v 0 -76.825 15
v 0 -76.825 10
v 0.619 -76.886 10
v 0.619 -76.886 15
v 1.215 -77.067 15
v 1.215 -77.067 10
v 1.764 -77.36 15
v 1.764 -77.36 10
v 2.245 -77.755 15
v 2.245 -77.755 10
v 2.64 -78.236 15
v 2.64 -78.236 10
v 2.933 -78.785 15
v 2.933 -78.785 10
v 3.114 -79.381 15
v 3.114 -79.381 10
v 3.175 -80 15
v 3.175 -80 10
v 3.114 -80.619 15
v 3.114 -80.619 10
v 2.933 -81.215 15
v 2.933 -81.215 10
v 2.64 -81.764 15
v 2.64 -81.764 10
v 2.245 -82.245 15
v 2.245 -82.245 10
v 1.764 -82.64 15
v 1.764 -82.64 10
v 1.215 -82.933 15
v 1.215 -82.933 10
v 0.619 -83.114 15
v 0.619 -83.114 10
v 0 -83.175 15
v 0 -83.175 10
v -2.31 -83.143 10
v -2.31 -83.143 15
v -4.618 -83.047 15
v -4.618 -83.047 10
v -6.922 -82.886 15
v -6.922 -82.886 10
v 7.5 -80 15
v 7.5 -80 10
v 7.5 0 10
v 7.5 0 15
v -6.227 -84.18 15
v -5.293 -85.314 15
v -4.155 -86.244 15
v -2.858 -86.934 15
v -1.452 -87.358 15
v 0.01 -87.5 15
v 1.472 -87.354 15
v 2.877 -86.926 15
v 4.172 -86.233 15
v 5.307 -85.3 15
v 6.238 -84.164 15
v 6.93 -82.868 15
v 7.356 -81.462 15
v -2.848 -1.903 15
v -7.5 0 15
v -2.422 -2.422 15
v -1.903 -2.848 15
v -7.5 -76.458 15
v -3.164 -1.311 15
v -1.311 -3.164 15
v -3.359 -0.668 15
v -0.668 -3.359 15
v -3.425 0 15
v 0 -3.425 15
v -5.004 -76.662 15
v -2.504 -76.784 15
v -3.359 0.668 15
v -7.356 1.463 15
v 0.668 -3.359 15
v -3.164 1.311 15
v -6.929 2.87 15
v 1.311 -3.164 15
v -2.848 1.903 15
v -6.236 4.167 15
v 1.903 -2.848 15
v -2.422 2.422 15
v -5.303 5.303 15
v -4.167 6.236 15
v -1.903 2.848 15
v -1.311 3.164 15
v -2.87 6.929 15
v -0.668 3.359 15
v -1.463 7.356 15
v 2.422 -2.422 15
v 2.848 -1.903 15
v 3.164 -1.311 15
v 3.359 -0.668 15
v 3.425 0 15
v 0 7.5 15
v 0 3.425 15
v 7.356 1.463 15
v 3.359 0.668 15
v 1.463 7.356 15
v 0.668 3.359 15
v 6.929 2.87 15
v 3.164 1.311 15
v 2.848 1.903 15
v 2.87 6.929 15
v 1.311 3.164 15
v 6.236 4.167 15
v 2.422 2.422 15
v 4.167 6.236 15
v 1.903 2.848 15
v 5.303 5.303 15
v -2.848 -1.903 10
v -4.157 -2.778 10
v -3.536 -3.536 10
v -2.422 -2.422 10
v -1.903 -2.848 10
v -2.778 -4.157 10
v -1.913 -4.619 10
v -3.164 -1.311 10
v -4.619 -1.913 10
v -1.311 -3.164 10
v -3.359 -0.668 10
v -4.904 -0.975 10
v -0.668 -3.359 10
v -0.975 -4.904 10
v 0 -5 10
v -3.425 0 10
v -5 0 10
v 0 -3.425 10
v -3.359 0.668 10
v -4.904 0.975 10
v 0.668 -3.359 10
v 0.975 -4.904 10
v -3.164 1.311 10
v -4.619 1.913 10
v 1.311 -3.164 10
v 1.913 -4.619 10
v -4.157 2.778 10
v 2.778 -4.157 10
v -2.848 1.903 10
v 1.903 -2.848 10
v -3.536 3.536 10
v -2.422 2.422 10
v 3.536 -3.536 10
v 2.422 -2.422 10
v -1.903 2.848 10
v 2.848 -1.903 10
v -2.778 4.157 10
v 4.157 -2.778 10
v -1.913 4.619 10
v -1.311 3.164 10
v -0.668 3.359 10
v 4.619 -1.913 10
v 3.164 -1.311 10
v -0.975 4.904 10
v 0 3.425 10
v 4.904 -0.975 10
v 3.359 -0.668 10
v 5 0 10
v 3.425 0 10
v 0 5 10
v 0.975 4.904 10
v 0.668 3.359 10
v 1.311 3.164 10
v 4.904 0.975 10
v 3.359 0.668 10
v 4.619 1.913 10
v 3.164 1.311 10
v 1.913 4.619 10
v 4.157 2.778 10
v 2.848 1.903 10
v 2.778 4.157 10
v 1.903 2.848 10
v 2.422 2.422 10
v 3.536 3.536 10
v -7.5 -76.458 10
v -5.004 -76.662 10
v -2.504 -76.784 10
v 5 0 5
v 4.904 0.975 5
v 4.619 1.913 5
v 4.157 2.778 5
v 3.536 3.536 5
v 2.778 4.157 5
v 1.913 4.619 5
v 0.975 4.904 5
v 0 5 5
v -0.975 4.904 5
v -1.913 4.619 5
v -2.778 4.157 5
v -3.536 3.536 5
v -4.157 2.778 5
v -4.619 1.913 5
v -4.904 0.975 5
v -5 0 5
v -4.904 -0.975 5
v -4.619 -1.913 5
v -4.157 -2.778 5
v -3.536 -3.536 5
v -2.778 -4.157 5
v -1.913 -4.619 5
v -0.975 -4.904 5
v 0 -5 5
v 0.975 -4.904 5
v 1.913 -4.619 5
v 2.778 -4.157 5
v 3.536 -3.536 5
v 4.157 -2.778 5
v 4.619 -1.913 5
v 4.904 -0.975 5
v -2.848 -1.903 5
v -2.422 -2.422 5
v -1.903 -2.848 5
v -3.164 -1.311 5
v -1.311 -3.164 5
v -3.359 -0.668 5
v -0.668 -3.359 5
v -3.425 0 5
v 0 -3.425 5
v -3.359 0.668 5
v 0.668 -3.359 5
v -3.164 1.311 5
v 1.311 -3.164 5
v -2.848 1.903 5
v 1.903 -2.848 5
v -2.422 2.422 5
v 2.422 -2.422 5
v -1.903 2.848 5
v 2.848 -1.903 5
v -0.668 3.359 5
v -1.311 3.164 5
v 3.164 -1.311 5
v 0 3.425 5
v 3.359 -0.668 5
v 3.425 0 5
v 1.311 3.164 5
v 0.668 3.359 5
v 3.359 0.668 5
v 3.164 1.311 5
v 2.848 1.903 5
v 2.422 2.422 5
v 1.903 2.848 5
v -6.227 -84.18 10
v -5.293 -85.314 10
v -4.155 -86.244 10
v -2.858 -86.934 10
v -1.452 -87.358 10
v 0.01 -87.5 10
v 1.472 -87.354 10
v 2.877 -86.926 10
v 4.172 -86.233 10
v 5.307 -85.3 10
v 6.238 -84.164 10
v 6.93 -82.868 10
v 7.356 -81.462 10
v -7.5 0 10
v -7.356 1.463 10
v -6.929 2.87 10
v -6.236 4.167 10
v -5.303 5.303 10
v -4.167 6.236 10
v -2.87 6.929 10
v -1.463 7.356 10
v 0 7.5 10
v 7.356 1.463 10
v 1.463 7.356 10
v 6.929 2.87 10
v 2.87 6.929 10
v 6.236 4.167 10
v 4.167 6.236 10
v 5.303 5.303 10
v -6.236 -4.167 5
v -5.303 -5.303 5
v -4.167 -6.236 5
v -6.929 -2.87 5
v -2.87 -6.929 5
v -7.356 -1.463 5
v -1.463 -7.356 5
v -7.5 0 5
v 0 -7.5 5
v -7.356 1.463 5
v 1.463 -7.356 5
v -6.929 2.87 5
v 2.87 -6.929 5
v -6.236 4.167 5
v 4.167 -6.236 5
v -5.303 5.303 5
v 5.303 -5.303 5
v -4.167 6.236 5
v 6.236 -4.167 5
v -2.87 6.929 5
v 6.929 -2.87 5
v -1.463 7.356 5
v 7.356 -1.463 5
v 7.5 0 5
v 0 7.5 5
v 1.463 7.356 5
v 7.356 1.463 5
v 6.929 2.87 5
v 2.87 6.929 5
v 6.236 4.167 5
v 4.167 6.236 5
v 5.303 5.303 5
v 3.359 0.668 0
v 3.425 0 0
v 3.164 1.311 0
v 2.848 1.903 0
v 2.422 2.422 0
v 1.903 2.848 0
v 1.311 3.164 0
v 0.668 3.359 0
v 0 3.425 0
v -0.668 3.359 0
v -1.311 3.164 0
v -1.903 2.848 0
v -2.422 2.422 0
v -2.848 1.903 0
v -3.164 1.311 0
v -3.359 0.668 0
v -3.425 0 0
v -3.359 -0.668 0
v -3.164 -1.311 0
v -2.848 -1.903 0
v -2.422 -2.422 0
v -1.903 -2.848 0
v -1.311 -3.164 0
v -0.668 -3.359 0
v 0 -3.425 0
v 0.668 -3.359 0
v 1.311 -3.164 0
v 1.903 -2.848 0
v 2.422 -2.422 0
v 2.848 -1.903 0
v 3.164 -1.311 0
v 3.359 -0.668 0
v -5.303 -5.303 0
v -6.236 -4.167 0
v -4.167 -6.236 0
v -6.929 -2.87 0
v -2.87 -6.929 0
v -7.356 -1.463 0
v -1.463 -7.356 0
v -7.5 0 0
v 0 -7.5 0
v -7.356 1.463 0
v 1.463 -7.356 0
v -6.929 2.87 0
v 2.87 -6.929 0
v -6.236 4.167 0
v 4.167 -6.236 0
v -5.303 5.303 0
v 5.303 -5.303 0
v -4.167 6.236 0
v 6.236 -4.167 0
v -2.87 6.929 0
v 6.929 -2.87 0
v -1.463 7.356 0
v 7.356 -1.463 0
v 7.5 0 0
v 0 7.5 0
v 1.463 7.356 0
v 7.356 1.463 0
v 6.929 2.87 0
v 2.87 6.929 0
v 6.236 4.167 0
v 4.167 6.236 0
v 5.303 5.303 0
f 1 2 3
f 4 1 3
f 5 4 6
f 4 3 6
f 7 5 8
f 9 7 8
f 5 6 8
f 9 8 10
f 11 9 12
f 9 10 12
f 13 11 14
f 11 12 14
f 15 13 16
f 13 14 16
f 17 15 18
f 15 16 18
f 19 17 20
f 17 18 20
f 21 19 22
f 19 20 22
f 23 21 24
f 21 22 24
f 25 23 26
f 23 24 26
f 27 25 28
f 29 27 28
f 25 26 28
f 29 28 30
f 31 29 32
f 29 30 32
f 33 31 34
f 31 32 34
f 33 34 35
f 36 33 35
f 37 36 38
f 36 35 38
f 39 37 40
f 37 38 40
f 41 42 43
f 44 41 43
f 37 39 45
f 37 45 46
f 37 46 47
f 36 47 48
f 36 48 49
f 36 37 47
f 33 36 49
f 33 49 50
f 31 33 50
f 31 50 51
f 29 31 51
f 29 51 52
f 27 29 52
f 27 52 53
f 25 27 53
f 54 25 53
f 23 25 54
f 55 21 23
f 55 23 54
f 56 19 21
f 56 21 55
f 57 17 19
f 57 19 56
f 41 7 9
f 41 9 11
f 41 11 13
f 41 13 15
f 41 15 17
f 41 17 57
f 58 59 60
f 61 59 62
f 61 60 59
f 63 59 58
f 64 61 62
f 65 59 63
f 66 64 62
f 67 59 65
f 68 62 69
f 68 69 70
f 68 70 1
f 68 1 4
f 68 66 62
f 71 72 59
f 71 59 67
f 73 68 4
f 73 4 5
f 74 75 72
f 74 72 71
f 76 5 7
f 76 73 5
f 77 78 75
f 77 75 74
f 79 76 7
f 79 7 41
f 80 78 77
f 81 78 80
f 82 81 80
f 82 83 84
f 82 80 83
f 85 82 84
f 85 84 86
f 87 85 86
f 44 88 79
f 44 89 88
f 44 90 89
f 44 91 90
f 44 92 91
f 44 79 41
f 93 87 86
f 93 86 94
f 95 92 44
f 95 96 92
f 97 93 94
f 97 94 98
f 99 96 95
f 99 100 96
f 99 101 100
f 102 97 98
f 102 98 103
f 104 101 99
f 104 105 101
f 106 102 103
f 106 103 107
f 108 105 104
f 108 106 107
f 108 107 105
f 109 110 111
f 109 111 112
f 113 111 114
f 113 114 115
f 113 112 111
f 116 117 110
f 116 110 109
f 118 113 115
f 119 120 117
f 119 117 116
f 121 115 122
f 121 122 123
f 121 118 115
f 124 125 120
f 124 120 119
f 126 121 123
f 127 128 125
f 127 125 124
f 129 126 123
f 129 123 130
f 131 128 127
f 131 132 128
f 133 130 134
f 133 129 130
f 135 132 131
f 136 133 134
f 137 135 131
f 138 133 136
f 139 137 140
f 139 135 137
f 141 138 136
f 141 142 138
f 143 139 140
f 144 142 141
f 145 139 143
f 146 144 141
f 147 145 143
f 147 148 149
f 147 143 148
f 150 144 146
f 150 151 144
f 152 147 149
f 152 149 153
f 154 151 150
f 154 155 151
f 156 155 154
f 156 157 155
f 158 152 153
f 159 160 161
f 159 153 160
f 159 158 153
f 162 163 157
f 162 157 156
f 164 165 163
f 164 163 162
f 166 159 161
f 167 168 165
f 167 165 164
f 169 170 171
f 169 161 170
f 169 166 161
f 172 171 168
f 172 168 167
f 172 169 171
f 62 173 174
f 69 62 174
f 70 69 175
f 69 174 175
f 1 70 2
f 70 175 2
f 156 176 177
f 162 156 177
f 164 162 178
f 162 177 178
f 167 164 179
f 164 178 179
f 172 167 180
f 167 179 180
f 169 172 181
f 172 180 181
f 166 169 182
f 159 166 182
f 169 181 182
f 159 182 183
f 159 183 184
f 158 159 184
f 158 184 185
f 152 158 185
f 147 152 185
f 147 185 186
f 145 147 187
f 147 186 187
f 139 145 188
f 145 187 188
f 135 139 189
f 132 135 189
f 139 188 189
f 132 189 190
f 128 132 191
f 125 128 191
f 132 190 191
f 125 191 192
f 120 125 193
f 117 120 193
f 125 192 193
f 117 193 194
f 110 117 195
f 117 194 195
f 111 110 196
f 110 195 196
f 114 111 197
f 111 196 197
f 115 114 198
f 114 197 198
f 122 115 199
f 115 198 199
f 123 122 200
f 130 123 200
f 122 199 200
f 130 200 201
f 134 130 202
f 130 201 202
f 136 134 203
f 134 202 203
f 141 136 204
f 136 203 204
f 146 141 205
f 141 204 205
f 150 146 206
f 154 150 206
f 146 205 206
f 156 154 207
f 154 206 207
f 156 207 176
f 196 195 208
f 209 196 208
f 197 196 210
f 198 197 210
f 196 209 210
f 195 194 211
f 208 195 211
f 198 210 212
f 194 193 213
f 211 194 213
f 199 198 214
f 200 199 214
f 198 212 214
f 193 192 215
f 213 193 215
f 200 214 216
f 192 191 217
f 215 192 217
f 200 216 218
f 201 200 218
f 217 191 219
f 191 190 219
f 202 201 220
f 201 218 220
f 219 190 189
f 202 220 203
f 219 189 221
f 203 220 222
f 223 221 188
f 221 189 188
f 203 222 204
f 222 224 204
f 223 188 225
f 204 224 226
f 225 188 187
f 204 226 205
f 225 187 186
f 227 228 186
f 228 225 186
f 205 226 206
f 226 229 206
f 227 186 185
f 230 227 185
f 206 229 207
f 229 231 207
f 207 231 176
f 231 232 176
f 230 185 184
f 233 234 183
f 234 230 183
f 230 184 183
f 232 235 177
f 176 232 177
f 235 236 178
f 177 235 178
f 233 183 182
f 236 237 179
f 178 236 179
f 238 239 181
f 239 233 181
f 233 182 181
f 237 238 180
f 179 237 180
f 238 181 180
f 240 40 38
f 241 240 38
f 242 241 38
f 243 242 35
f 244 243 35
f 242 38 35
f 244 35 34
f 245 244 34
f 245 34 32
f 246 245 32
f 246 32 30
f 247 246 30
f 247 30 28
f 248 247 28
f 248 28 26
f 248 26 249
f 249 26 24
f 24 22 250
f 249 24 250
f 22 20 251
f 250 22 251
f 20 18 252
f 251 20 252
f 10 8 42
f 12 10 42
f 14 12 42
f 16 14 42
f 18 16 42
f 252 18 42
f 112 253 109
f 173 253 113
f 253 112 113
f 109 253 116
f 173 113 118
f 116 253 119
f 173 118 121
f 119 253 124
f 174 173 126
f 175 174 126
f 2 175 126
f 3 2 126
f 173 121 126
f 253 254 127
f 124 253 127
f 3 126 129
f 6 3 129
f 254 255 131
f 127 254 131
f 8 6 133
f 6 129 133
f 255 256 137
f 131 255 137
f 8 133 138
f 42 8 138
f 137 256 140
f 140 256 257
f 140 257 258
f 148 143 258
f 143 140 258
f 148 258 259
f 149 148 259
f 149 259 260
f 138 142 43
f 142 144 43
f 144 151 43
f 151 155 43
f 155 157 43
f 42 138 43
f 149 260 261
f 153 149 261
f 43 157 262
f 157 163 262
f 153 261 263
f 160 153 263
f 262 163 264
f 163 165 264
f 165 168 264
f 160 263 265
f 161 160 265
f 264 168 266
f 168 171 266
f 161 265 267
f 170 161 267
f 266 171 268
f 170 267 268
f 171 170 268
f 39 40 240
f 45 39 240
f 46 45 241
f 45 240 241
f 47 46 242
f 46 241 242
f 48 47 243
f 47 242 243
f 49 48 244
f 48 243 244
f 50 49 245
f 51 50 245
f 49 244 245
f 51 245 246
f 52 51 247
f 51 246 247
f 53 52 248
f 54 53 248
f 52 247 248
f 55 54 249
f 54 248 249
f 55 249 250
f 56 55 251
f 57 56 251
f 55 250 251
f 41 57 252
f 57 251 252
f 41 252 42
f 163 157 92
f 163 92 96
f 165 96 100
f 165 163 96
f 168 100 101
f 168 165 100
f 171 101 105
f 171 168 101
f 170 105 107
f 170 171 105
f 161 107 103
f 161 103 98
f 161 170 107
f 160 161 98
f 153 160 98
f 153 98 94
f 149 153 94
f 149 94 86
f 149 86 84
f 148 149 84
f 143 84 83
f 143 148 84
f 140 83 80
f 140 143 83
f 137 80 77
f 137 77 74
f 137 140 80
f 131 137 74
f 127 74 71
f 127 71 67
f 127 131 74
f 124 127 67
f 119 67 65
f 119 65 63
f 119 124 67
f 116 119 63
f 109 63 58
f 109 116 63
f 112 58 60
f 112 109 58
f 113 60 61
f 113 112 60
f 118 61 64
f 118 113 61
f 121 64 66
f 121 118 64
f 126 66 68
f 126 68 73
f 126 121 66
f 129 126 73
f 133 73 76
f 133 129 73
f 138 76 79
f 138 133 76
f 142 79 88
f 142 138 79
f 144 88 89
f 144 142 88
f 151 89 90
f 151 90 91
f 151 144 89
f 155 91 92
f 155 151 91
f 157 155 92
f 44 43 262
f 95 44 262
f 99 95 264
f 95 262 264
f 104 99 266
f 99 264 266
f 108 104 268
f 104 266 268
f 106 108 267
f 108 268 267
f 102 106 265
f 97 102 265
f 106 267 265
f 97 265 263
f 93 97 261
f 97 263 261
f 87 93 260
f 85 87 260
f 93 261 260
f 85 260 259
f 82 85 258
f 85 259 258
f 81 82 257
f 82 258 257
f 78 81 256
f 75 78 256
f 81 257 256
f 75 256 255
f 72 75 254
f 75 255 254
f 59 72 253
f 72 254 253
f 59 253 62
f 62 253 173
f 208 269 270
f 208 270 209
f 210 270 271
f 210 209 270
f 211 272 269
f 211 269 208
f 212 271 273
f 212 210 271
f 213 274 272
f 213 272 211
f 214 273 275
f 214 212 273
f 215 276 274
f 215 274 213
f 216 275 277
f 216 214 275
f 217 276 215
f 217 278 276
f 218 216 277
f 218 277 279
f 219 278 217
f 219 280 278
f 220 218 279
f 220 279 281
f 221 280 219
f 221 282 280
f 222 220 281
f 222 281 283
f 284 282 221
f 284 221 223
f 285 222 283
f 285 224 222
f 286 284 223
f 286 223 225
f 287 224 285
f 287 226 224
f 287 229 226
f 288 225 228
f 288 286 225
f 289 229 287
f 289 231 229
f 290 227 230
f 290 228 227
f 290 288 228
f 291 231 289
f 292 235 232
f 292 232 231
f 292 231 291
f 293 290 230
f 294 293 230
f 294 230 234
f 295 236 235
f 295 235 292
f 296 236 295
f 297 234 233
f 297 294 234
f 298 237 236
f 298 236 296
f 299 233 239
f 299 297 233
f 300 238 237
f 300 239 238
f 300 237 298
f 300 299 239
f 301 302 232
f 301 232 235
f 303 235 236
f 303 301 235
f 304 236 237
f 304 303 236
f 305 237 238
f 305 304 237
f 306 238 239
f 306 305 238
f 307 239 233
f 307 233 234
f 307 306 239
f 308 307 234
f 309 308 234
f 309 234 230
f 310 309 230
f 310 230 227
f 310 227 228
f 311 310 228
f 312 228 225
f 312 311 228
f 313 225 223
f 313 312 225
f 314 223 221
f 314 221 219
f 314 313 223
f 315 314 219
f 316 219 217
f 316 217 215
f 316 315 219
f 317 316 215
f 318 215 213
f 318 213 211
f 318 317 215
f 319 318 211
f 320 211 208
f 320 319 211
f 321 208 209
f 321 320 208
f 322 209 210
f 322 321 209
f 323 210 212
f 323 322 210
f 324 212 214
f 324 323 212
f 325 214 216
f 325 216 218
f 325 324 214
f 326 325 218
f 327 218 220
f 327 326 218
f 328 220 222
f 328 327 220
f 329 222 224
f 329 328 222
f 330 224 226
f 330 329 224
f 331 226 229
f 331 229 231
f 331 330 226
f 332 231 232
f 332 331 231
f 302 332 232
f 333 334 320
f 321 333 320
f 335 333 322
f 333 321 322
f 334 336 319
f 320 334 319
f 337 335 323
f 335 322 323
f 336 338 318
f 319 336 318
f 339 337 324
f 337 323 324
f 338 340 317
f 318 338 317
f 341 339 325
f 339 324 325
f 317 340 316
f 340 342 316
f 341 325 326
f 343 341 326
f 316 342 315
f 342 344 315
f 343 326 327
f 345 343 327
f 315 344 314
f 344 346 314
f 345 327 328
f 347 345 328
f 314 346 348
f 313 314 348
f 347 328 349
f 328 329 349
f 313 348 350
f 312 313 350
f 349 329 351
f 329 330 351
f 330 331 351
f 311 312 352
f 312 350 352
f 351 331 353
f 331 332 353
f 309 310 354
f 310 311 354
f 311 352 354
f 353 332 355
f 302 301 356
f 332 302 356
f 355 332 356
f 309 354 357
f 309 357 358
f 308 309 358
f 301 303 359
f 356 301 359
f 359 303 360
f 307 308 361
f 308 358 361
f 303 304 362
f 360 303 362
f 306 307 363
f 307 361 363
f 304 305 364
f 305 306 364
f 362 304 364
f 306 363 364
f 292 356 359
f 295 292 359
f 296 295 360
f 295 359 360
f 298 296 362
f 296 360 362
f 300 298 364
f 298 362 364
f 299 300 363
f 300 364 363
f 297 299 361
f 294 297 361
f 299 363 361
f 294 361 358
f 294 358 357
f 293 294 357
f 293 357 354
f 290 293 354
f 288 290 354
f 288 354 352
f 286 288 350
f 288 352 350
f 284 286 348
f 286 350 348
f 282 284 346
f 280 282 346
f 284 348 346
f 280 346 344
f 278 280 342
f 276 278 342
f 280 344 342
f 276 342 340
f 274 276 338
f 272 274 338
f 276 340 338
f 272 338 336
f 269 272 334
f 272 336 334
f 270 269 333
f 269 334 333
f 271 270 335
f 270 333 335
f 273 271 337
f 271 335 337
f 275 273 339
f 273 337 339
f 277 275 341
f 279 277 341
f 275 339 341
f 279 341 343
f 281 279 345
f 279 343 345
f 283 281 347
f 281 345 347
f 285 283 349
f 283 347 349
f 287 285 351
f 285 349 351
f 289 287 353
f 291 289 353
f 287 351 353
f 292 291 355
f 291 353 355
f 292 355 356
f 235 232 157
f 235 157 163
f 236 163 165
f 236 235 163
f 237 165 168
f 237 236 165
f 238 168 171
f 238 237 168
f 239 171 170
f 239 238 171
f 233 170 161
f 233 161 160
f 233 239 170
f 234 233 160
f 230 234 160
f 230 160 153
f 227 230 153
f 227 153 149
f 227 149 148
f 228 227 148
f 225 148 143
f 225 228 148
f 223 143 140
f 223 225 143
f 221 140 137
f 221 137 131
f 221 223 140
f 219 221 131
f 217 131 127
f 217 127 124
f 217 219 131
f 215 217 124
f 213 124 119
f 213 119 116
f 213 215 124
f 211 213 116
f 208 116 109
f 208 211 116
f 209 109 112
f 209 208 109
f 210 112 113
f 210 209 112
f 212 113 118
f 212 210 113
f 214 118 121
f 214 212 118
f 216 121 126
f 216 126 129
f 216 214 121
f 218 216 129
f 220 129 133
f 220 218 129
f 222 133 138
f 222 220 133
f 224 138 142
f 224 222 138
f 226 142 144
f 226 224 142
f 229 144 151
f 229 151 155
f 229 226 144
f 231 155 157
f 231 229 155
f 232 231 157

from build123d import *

# Parameters (mm, degrees)
F0_R     = 7.5
F0_R_2   = 3.425
F1_DEPTH = 5
F3_R     = 5
F3_R_2   = 3.425
F4_DEPTH = 5
F6_R     = 3.425
F7_DEPTH = 5


with BuildPart() as f1:
    # F0 (on Top) → F1 (new body)
    with BuildSketch(Plane.XY):
        Circle(F0_R)
        Circle(F0_R_2, mode=Mode.SUBTRACT)
    extrude(amount=F1_DEPTH)


with BuildPart() as f4:
    # F3 (on offset) → F4 (new body)
    with BuildSketch(Plane.XY.offset(5)):
        Circle(F3_R)
        Circle(F3_R_2, mode=Mode.SUBTRACT)
    extrude(amount=F4_DEPTH)


with BuildPart() as f7:
    # F6 (on offset) → F7 (new body)
    with BuildSketch(Plane.XY.offset(10)):
        with BuildLine():
            Line((7.5, -80), (7.5, 0))
            ThreePointArc((7.5, 0), (0, 7.5), (-7.5, 0))
            Line((-7.5, 0), (-7.5, -76.458032))
            ThreePointArc((-7.5, -76.458032), (-3.754486, -76.733203), (0, -76.825))
            ThreePointArc((0, -76.825), (3.175, -80), (0, -83.175))
            ThreePointArc((0, -83.175), (-3.464164, -83.102829), (-6.922316, -82.886441))
            ThreePointArc((-6.922316, -82.886441), (1.471841, -87.354161), (7.5, -80))
        make_face()
        Circle(F6_R, mode=Mode.SUBTRACT)
    extrude(amount=F7_DEPTH)


solid = Compound([f1.part, f4.part, f7.part])
